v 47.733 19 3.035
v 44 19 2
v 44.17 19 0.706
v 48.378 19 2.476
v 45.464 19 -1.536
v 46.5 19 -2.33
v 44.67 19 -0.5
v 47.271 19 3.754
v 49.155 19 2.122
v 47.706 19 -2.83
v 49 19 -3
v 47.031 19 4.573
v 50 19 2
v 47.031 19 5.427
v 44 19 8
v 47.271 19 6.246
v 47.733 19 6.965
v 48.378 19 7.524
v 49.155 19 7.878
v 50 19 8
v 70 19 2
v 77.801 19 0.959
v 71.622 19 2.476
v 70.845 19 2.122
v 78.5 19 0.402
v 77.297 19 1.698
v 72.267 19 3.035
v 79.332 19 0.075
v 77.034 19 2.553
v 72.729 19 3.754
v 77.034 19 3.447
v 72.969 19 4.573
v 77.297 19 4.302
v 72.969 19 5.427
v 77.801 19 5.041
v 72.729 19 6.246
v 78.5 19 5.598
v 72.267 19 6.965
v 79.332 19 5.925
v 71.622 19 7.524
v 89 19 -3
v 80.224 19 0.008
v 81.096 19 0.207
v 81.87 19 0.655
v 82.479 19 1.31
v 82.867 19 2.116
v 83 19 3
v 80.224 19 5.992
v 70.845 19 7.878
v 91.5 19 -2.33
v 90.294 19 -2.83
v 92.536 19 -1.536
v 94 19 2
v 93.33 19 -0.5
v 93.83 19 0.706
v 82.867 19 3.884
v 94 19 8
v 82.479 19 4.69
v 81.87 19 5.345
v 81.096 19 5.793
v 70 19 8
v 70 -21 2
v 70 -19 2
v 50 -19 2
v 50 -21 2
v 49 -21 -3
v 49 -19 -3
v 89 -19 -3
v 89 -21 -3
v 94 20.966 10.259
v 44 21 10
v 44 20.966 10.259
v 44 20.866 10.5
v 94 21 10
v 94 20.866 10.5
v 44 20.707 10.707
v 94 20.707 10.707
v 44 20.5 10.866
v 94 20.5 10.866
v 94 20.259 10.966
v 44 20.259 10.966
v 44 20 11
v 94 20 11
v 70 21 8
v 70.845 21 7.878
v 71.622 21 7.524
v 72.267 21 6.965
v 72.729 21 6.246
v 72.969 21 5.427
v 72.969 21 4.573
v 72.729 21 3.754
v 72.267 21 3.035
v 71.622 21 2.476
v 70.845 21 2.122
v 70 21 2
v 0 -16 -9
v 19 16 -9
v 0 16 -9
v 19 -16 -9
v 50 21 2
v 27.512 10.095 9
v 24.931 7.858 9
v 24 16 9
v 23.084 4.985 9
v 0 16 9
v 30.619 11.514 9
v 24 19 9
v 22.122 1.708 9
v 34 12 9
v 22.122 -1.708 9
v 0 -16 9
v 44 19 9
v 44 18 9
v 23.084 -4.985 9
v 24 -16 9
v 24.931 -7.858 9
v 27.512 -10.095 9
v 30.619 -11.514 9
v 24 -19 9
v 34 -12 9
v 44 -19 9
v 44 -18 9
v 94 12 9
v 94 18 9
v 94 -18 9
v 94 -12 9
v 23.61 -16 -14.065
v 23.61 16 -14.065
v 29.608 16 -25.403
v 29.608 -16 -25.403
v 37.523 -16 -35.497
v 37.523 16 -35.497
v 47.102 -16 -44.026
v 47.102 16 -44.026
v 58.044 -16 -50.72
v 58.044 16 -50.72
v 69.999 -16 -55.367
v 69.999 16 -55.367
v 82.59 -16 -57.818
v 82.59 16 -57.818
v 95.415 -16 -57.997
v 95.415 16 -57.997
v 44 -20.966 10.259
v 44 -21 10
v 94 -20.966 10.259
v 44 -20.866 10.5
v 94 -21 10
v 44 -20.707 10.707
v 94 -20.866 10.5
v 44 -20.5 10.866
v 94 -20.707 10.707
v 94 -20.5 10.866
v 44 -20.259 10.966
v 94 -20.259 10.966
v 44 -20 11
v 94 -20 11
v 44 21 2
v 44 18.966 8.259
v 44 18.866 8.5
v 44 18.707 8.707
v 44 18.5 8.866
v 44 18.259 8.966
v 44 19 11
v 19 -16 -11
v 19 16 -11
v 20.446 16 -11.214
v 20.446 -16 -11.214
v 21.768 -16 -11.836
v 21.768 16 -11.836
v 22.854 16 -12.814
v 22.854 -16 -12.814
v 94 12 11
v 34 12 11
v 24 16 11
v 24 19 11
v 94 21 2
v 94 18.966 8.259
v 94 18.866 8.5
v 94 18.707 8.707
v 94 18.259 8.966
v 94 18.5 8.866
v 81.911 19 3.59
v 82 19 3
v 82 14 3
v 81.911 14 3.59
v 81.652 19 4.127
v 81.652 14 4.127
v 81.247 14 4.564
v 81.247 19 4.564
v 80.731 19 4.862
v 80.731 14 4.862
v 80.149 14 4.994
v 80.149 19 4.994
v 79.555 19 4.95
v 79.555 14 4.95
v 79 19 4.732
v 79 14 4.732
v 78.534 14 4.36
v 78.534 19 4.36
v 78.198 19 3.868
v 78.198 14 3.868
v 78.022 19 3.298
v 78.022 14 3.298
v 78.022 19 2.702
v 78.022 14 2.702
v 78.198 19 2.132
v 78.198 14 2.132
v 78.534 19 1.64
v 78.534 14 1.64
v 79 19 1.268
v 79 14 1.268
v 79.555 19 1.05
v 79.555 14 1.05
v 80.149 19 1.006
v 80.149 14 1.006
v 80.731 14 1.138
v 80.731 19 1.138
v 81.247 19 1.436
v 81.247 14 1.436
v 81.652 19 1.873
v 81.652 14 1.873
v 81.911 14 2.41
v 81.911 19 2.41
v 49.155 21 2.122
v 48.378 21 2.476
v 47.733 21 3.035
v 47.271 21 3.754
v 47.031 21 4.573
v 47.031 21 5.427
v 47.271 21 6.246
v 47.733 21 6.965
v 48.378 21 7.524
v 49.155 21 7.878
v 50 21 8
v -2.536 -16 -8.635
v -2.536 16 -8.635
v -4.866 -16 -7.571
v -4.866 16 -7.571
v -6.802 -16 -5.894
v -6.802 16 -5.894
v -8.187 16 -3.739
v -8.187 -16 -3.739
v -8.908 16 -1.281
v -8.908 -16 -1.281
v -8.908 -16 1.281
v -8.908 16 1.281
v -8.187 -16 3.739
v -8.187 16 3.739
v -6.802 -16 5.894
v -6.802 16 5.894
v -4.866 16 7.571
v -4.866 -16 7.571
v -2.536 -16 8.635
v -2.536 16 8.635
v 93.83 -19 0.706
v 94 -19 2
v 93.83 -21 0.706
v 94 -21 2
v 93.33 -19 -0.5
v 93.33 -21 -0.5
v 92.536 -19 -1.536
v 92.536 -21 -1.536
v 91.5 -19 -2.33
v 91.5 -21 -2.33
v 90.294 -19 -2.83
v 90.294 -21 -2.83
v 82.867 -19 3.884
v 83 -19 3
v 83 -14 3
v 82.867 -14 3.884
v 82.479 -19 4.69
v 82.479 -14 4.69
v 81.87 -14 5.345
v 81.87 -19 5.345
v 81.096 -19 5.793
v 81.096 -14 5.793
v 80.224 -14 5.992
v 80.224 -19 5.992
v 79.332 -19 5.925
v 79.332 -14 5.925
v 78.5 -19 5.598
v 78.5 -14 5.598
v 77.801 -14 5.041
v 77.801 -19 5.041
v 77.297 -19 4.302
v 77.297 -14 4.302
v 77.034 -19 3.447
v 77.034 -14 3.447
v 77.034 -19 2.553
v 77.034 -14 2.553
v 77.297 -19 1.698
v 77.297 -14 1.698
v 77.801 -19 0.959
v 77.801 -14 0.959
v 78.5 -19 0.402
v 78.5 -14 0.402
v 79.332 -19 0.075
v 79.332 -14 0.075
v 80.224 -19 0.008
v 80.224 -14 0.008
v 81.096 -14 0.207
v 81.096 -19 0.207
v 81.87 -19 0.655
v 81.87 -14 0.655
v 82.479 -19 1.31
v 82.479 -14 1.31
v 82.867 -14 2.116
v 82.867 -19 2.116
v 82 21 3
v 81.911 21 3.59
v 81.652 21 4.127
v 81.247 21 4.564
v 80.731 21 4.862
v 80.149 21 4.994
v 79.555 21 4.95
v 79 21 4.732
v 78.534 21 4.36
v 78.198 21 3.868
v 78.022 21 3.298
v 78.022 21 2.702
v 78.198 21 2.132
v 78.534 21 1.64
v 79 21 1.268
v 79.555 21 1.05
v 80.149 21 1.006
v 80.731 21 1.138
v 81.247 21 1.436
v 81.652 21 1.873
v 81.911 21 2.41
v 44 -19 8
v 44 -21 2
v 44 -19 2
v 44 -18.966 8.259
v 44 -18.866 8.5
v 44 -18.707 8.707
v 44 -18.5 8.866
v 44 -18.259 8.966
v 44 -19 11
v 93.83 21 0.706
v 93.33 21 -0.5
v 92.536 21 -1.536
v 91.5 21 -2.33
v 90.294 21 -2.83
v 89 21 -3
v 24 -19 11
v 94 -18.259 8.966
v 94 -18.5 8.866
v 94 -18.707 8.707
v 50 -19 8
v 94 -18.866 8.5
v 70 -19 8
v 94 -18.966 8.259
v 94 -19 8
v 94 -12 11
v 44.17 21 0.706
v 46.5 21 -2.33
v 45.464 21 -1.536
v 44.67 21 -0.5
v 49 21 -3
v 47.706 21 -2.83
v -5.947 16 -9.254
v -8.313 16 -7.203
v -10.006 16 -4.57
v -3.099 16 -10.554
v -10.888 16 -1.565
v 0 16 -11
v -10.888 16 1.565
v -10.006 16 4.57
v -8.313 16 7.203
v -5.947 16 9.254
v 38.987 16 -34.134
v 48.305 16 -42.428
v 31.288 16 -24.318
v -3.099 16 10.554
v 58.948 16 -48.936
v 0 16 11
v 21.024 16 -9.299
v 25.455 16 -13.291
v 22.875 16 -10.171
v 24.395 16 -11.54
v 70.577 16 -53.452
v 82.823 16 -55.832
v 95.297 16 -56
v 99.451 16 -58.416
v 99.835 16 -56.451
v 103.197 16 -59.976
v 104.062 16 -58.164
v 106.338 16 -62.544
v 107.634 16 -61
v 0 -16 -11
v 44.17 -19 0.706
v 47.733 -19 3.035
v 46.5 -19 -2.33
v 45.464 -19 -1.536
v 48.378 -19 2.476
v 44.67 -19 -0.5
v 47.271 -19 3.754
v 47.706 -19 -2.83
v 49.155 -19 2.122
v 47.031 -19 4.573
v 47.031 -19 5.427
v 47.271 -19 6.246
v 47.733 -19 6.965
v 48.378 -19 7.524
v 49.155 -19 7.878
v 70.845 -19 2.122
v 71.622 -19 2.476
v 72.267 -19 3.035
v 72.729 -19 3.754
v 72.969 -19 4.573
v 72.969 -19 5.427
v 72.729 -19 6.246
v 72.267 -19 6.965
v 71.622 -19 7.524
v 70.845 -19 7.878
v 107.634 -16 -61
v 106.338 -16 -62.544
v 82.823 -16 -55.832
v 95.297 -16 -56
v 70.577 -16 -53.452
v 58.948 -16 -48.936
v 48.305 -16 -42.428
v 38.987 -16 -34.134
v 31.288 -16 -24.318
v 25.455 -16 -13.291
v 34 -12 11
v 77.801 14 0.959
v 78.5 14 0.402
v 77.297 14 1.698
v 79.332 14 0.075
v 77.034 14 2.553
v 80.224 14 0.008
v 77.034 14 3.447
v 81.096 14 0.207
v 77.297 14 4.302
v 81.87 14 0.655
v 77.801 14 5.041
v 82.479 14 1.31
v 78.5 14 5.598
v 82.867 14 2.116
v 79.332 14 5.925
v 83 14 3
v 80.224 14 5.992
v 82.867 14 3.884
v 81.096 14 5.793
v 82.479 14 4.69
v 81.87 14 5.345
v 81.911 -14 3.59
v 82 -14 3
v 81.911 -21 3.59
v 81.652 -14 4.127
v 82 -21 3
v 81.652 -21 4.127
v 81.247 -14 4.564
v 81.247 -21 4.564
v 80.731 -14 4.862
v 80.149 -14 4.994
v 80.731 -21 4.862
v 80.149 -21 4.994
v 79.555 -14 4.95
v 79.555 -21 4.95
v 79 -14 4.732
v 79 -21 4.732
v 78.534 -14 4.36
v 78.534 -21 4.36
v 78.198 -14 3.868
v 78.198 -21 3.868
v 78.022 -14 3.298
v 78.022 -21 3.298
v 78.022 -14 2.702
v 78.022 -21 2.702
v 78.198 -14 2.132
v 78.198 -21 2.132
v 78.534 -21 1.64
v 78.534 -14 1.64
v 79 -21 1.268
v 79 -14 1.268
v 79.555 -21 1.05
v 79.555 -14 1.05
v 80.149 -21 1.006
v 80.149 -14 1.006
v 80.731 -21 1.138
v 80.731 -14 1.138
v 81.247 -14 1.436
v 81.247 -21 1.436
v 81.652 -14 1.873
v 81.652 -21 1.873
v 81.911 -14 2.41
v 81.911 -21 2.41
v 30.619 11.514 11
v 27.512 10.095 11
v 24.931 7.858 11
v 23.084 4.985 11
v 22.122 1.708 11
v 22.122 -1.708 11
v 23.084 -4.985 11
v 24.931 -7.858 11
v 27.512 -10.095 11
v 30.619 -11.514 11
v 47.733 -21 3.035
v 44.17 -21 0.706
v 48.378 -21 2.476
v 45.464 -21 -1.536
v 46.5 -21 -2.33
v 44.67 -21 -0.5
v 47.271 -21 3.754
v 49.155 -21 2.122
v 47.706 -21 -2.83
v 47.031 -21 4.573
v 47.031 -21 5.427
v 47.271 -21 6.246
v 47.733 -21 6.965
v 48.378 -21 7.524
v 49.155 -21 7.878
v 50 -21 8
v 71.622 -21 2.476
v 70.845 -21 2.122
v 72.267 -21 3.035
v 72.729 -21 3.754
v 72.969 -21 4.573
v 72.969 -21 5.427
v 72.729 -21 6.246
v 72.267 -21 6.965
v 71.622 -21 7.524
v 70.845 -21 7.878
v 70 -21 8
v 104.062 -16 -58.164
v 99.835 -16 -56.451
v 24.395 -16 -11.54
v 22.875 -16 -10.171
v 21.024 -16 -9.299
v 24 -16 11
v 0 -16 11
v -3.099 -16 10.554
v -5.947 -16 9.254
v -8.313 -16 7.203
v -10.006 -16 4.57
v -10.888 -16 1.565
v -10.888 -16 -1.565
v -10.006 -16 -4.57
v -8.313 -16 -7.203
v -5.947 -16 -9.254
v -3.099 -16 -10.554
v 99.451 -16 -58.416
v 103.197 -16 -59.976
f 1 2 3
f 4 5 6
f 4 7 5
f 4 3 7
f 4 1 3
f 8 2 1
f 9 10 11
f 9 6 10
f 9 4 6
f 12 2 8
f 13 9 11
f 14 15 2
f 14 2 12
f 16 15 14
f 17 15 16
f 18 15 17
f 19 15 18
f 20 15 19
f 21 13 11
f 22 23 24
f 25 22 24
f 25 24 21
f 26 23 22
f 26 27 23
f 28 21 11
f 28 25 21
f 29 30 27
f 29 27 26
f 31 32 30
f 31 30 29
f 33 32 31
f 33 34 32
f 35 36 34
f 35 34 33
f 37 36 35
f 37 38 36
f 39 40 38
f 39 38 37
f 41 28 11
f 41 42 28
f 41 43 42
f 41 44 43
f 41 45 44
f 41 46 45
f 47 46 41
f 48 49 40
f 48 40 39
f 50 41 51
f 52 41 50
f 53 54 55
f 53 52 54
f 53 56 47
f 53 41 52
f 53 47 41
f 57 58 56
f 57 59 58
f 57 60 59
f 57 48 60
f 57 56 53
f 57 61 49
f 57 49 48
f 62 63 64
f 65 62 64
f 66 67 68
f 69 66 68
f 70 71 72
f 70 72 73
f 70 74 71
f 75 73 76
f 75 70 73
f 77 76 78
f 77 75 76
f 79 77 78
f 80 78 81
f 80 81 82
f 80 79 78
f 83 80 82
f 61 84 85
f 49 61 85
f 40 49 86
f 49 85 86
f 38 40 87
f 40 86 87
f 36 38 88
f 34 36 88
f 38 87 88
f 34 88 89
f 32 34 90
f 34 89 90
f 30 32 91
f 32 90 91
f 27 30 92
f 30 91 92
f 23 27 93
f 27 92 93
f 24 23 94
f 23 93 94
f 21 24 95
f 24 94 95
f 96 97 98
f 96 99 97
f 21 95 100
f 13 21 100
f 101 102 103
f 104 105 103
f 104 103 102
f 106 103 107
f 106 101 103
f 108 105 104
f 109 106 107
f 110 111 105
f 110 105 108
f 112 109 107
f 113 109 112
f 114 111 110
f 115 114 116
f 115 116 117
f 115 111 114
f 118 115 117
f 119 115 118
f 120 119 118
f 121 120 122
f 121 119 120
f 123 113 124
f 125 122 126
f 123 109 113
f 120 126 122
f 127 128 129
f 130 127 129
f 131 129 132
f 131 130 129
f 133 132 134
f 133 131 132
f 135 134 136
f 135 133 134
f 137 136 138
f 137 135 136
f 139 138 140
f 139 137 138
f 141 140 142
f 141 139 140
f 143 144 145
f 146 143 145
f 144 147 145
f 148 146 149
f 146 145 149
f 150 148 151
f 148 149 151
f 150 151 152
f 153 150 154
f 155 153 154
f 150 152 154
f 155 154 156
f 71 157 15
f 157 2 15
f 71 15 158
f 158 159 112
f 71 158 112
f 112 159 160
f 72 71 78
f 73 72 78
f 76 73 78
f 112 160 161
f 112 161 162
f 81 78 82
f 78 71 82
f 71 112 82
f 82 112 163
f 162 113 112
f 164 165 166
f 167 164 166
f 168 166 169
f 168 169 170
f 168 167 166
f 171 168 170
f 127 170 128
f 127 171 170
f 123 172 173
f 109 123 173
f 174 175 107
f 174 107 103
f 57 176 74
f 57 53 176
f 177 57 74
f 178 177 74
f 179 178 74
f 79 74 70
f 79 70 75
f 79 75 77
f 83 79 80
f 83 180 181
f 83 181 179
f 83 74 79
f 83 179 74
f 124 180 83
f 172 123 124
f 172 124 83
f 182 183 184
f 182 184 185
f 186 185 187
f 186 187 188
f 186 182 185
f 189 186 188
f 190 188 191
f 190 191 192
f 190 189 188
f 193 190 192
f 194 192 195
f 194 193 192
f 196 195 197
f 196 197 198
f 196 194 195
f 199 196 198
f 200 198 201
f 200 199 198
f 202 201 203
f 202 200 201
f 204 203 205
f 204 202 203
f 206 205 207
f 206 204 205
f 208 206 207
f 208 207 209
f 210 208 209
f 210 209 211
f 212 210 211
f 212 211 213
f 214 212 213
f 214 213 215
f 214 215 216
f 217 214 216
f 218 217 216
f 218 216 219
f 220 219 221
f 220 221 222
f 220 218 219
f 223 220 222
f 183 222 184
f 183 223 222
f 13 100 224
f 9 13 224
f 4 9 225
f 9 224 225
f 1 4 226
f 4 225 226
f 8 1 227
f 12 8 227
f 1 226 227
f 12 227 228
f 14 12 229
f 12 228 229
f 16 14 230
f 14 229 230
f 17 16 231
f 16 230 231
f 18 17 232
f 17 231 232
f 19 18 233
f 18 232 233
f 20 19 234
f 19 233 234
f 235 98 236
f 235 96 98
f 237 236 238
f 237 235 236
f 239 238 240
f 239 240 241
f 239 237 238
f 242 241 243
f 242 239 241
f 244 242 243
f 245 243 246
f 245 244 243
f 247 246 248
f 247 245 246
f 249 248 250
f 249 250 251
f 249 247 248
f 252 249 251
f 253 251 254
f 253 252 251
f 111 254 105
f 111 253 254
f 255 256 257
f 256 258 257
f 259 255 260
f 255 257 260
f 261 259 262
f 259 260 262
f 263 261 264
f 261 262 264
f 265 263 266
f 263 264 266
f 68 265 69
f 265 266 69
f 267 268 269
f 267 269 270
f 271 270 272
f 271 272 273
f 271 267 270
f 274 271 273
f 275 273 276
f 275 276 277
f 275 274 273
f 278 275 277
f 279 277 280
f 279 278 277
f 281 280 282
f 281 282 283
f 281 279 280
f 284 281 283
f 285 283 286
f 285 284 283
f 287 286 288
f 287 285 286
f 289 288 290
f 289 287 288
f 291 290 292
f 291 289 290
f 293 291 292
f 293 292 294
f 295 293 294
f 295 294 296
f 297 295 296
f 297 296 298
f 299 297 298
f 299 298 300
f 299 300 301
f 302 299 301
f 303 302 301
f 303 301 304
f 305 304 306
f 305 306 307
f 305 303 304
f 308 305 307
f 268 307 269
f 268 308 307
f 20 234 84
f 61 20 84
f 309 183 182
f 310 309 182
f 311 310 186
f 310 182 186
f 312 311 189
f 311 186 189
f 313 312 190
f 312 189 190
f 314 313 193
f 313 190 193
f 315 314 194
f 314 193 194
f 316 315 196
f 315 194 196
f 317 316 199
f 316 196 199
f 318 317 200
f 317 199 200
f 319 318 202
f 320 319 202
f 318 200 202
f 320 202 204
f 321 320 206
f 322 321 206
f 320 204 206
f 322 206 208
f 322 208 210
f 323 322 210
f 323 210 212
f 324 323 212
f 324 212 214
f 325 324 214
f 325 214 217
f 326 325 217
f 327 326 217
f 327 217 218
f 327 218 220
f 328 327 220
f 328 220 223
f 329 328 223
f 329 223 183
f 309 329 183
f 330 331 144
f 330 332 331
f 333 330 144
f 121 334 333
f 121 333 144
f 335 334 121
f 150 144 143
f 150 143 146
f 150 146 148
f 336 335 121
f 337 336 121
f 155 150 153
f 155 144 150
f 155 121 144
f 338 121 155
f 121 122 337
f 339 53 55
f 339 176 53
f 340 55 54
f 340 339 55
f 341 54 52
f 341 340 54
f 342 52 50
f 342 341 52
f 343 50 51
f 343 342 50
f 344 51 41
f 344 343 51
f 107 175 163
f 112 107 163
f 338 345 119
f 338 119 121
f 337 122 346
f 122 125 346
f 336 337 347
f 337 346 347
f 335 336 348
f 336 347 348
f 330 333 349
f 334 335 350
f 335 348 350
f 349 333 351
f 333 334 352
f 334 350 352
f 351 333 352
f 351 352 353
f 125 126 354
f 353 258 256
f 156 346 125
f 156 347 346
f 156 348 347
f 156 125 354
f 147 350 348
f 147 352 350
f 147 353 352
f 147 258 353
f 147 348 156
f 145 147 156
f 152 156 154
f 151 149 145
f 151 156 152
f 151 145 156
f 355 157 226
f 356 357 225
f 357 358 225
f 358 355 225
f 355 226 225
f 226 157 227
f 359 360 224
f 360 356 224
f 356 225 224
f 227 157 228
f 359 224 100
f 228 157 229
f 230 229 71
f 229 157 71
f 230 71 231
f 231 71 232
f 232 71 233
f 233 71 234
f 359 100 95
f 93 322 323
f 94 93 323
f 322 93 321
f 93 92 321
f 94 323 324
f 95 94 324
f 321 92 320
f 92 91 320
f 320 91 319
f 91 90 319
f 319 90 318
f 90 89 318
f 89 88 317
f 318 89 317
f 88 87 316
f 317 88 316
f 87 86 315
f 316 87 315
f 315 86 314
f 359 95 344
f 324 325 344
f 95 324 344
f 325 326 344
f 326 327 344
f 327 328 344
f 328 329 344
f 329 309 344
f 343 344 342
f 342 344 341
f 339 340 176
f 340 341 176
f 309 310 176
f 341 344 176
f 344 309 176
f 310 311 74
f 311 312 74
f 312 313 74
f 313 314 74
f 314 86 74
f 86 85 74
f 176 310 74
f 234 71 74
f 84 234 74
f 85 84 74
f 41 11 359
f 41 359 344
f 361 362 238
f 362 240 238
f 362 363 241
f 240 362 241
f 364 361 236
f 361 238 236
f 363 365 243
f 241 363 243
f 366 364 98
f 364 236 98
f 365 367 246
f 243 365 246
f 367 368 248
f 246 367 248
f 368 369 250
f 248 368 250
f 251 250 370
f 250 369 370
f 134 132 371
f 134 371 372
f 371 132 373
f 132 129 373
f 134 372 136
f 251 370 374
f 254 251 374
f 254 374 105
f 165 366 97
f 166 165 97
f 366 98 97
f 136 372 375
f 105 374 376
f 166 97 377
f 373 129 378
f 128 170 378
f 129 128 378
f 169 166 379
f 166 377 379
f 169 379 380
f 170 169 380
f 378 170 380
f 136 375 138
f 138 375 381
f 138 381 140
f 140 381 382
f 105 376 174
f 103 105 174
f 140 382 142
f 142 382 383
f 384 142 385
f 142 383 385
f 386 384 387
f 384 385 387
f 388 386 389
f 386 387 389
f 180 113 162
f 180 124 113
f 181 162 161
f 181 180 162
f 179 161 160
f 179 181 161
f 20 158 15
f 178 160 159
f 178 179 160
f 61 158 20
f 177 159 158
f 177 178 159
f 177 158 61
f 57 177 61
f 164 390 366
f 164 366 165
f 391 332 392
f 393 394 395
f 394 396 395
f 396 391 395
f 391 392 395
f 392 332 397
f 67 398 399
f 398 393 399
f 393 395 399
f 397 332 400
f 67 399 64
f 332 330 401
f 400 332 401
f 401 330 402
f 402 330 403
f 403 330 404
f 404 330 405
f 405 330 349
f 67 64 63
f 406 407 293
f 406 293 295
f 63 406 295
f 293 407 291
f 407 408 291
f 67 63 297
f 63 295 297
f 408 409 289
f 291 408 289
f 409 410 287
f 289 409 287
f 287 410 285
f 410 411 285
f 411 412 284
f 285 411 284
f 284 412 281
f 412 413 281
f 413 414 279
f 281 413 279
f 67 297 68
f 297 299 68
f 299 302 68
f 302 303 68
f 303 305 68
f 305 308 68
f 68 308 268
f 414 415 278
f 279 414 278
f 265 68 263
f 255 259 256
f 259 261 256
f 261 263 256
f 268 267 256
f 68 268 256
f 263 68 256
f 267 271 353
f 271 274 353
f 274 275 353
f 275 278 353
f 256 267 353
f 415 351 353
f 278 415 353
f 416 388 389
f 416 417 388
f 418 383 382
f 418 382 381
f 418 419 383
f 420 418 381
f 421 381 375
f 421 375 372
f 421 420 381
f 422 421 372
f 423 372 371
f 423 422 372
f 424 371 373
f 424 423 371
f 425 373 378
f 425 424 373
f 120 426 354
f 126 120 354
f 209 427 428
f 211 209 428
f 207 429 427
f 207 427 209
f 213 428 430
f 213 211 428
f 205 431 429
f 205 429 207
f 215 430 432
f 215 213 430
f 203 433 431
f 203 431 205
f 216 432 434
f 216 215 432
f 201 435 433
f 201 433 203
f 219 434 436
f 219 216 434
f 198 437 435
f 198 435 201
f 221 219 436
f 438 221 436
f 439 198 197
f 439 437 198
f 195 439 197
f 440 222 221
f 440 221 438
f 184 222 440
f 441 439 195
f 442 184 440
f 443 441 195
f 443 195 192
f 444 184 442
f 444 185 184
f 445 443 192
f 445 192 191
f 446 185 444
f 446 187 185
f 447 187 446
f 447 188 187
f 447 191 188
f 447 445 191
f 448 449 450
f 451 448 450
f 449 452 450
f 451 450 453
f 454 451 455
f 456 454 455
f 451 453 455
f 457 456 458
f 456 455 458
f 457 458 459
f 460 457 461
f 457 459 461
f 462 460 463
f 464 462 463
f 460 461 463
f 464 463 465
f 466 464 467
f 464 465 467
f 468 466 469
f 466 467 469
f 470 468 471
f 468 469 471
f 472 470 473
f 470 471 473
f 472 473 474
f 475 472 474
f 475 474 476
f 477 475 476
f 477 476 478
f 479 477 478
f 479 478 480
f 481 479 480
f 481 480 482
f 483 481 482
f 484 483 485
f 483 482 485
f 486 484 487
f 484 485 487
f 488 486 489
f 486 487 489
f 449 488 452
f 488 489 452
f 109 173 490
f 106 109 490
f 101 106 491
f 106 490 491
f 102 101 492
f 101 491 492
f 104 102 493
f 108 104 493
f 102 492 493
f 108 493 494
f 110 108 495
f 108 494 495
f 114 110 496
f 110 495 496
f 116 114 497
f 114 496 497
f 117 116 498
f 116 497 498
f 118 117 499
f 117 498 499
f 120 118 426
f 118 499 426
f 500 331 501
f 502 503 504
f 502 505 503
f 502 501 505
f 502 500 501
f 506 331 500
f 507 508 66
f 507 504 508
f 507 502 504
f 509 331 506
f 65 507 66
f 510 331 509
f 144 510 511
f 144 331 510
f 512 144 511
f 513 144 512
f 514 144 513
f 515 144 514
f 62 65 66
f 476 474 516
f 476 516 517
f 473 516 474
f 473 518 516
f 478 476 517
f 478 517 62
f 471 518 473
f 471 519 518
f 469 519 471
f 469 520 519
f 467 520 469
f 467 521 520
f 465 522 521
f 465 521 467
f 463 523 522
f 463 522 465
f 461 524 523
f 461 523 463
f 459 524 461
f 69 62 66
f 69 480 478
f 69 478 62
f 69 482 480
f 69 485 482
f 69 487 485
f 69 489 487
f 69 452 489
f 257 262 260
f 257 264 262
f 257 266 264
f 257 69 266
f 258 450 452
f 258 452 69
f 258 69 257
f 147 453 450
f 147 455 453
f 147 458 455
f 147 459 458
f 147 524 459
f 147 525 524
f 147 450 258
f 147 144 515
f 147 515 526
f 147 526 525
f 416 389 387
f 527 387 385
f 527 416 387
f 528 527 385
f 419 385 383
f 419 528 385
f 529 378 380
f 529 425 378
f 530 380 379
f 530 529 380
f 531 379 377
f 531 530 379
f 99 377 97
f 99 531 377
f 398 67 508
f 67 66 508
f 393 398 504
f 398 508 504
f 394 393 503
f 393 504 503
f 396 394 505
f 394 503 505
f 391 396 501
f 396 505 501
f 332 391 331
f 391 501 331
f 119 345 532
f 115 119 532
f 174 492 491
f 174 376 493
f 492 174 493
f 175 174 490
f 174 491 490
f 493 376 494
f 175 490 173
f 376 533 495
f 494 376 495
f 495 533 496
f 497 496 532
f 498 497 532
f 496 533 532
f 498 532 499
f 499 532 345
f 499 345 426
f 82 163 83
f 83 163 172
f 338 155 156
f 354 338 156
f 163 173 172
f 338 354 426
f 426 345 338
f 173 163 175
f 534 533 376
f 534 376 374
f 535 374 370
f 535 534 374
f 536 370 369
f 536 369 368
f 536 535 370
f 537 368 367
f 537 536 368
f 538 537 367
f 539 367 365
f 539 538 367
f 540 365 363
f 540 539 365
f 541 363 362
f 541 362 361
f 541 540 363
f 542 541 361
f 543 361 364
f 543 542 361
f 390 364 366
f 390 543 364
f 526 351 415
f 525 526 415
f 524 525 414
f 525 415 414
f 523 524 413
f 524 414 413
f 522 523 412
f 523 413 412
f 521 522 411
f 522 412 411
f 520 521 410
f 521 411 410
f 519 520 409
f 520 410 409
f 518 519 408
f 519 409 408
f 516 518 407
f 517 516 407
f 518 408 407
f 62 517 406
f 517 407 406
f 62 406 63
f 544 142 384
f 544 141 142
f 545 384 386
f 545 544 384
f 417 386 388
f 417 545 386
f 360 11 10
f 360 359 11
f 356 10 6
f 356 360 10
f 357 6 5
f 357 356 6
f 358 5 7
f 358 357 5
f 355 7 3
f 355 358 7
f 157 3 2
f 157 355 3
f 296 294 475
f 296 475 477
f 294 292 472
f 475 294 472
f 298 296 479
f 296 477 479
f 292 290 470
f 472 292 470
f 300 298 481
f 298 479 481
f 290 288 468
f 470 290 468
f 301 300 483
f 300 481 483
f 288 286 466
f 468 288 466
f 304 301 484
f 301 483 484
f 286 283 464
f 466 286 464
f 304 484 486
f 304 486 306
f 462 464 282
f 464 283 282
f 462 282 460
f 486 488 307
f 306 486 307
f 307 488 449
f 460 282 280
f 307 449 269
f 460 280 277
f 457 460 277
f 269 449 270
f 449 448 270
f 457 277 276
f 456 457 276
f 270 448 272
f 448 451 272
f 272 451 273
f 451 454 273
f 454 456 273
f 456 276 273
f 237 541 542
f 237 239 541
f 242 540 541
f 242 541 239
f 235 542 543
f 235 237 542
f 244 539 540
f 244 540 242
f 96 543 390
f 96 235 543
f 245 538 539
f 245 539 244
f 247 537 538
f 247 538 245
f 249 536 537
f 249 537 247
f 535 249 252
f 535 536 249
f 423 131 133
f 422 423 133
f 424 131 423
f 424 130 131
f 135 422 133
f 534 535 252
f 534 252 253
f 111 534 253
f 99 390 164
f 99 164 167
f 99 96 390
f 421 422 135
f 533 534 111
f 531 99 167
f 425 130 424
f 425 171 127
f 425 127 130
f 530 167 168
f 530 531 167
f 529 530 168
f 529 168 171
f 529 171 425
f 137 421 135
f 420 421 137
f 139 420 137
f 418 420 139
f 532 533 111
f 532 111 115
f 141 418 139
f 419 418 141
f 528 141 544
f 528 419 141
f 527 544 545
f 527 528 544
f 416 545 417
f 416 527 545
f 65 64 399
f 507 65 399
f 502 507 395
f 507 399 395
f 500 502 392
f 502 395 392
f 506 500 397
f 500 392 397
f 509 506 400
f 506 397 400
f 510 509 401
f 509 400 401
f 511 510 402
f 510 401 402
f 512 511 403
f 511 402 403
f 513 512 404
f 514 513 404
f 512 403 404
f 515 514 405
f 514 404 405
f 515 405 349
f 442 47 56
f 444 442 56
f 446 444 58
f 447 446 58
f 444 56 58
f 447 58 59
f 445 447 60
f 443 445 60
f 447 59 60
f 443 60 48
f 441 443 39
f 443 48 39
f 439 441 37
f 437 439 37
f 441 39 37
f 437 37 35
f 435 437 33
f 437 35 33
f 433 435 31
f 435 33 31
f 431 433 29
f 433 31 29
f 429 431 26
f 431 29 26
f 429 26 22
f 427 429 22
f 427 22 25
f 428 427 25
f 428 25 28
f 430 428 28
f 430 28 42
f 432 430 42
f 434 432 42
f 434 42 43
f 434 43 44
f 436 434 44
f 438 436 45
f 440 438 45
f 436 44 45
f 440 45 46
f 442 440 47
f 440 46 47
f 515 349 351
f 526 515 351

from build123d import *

# Parameters (mm, degrees)
F1_DEPTH  = 16
F2_W      = 70
F2_H      = 3
F3_DEPTH  = 2
F4_W      = 50
F4_H      = 14
F5_DEPTH  = 2
F6_R      = 1
F9_DEPTH  = 2
F11_DEPTH = 42.001
F13_D     = 4
F14_R     = 3
F14_R_2   = 2
F15_DEPTH = 5
F17_R     = 5


with BuildPart() as f1:
    # F0 (on Front) → F1 (new body)
    with BuildSketch(Plane.XZ):
        with BuildLine():
            Line((94, 11), (0, 11))
            ThreePointArc((0, 11), (-11, 0), (0, -11))
            Line((0, -11), (19, -11))
            ThreePointArc((19, -11), (21.7681124643, -11.8361612201), (23.6103896104, -14.064978646))
            ThreePointArc((23.6103896104, -14.064978646), (52.4237101957, -47.6174640031), (95.4149528414, -57.9967593826))
            ThreePointArc((95.4149528414, -57.9967593826), (101.3804745105, -59.0597282402), (106.3380534538, -62.5439444501))
            Line((106.3380534538, -62.5439444501), (107.6335766724, -61))
            ThreePointArc((107.6335766724, -61), (102.0097459375, -57.1560789275), (95.2965735981, -56))
            ThreePointArc((95.2965735981, -56), (53.4811996085, -45.9198240056), (25.4545454545, -13.2909701044))
            ThreePointArc((25.4545454545, -13.2909701044), (22.87535745, -10.1706257081), (19, -9))
            Line((19, -9), (0, -9))
            ThreePointArc((0, -9), (-9, 0), (0, 9))
            Line((0, 9), (94, 9))
            Line((94, 9), (94, 11))
        make_face()
    extrude(amount=F1_DEPTH)

    # F2 (on face) → F3 (join)
    with BuildSketch(Plane.XY.offset(11)):
        with Locations((59, -17.5)):
            Rectangle(F2_W, F2_H)
    extrude(amount=-F3_DEPTH)

    # F4 (on face) → F5 (join)
    with BuildSketch(Plane.XZ.offset(19)):
        with Locations((69, 4)):
            Rectangle(F4_W, F4_H)
    extrude(amount=F5_DEPTH)

    # F6
    f6_edges = [f1.edges().sort_by_distance(p)[0] for p in [
        (69, -21, 11),
        (69, -19, 9),
    ]]
    fillet(f6_edges, radius=F6_R)

    # F7: F1 across plane


with BuildPart() as f1_1:
    add(f1.part)
    add(f1.part.mirror(Plane.XZ))

    # F8 (on face) → F9 (cut)
    with BuildSketch(Plane.XY.offset(11)):
        with BuildLine():
            Line((94, 12), (34, 12))
            ThreePointArc((34, 12), (22, 0), (34, -12))
            Line((34, -12), (94, -12))
            Line((94, -12), (94, 12))
        make_face()
    extrude(amount=-F9_DEPTH, mode=Mode.SUBTRACT)

    # F10 (on face) → F11 (cut, through all)
    with BuildSketch(Plane(origin=(0, 21, 0), x_dir=(-1, 0, 0), z_dir=(0, 1, 0))):
        with BuildLine():
            ThreePointArc((-70, 8), (-73, 5), (-70, 2))
            Line((-70, 2), (-50, 2))
            ThreePointArc((-50, 2), (-47, 5), (-50, 8))
            Line((-50, 8), (-70, 8))
        make_face()
    extrude(amount=-F11_DEPTH, mode=Mode.SUBTRACT)

    # F13 (through all)
    with Locations(Plane(origin=(0, 21, 0), x_dir=(-1, 0, 0), z_dir=(0, 1, 0))):
        with Locations((-80, 3)):
            Hole(F13_D / 2)

    # F14 (on face) → F15 (join)
    with BuildSketch(Plane.XZ.offset(-19)):
        with Locations((80, 3)):
            Circle(F14_R)
        with Locations((80, 3)):
            Circle(F14_R_2, mode=Mode.SUBTRACT)
    extrude(amount=F15_DEPTH)

    # F16: F1 across plane


with BuildPart() as f1_2:
    add(f1_1.part)
    add(f1_1.part.mirror(Plane.XZ))

    # F17
    f17_edges = [f1_2.edges().sort_by_distance(p)[0] for p in [
        (94, 20, -3),
        (44, 20, -3),
        (94, -20, -3),
        (44, -20, -3),
    ]]
    fillet(f17_edges, radius=F17_R)


solid = f1_2.part
